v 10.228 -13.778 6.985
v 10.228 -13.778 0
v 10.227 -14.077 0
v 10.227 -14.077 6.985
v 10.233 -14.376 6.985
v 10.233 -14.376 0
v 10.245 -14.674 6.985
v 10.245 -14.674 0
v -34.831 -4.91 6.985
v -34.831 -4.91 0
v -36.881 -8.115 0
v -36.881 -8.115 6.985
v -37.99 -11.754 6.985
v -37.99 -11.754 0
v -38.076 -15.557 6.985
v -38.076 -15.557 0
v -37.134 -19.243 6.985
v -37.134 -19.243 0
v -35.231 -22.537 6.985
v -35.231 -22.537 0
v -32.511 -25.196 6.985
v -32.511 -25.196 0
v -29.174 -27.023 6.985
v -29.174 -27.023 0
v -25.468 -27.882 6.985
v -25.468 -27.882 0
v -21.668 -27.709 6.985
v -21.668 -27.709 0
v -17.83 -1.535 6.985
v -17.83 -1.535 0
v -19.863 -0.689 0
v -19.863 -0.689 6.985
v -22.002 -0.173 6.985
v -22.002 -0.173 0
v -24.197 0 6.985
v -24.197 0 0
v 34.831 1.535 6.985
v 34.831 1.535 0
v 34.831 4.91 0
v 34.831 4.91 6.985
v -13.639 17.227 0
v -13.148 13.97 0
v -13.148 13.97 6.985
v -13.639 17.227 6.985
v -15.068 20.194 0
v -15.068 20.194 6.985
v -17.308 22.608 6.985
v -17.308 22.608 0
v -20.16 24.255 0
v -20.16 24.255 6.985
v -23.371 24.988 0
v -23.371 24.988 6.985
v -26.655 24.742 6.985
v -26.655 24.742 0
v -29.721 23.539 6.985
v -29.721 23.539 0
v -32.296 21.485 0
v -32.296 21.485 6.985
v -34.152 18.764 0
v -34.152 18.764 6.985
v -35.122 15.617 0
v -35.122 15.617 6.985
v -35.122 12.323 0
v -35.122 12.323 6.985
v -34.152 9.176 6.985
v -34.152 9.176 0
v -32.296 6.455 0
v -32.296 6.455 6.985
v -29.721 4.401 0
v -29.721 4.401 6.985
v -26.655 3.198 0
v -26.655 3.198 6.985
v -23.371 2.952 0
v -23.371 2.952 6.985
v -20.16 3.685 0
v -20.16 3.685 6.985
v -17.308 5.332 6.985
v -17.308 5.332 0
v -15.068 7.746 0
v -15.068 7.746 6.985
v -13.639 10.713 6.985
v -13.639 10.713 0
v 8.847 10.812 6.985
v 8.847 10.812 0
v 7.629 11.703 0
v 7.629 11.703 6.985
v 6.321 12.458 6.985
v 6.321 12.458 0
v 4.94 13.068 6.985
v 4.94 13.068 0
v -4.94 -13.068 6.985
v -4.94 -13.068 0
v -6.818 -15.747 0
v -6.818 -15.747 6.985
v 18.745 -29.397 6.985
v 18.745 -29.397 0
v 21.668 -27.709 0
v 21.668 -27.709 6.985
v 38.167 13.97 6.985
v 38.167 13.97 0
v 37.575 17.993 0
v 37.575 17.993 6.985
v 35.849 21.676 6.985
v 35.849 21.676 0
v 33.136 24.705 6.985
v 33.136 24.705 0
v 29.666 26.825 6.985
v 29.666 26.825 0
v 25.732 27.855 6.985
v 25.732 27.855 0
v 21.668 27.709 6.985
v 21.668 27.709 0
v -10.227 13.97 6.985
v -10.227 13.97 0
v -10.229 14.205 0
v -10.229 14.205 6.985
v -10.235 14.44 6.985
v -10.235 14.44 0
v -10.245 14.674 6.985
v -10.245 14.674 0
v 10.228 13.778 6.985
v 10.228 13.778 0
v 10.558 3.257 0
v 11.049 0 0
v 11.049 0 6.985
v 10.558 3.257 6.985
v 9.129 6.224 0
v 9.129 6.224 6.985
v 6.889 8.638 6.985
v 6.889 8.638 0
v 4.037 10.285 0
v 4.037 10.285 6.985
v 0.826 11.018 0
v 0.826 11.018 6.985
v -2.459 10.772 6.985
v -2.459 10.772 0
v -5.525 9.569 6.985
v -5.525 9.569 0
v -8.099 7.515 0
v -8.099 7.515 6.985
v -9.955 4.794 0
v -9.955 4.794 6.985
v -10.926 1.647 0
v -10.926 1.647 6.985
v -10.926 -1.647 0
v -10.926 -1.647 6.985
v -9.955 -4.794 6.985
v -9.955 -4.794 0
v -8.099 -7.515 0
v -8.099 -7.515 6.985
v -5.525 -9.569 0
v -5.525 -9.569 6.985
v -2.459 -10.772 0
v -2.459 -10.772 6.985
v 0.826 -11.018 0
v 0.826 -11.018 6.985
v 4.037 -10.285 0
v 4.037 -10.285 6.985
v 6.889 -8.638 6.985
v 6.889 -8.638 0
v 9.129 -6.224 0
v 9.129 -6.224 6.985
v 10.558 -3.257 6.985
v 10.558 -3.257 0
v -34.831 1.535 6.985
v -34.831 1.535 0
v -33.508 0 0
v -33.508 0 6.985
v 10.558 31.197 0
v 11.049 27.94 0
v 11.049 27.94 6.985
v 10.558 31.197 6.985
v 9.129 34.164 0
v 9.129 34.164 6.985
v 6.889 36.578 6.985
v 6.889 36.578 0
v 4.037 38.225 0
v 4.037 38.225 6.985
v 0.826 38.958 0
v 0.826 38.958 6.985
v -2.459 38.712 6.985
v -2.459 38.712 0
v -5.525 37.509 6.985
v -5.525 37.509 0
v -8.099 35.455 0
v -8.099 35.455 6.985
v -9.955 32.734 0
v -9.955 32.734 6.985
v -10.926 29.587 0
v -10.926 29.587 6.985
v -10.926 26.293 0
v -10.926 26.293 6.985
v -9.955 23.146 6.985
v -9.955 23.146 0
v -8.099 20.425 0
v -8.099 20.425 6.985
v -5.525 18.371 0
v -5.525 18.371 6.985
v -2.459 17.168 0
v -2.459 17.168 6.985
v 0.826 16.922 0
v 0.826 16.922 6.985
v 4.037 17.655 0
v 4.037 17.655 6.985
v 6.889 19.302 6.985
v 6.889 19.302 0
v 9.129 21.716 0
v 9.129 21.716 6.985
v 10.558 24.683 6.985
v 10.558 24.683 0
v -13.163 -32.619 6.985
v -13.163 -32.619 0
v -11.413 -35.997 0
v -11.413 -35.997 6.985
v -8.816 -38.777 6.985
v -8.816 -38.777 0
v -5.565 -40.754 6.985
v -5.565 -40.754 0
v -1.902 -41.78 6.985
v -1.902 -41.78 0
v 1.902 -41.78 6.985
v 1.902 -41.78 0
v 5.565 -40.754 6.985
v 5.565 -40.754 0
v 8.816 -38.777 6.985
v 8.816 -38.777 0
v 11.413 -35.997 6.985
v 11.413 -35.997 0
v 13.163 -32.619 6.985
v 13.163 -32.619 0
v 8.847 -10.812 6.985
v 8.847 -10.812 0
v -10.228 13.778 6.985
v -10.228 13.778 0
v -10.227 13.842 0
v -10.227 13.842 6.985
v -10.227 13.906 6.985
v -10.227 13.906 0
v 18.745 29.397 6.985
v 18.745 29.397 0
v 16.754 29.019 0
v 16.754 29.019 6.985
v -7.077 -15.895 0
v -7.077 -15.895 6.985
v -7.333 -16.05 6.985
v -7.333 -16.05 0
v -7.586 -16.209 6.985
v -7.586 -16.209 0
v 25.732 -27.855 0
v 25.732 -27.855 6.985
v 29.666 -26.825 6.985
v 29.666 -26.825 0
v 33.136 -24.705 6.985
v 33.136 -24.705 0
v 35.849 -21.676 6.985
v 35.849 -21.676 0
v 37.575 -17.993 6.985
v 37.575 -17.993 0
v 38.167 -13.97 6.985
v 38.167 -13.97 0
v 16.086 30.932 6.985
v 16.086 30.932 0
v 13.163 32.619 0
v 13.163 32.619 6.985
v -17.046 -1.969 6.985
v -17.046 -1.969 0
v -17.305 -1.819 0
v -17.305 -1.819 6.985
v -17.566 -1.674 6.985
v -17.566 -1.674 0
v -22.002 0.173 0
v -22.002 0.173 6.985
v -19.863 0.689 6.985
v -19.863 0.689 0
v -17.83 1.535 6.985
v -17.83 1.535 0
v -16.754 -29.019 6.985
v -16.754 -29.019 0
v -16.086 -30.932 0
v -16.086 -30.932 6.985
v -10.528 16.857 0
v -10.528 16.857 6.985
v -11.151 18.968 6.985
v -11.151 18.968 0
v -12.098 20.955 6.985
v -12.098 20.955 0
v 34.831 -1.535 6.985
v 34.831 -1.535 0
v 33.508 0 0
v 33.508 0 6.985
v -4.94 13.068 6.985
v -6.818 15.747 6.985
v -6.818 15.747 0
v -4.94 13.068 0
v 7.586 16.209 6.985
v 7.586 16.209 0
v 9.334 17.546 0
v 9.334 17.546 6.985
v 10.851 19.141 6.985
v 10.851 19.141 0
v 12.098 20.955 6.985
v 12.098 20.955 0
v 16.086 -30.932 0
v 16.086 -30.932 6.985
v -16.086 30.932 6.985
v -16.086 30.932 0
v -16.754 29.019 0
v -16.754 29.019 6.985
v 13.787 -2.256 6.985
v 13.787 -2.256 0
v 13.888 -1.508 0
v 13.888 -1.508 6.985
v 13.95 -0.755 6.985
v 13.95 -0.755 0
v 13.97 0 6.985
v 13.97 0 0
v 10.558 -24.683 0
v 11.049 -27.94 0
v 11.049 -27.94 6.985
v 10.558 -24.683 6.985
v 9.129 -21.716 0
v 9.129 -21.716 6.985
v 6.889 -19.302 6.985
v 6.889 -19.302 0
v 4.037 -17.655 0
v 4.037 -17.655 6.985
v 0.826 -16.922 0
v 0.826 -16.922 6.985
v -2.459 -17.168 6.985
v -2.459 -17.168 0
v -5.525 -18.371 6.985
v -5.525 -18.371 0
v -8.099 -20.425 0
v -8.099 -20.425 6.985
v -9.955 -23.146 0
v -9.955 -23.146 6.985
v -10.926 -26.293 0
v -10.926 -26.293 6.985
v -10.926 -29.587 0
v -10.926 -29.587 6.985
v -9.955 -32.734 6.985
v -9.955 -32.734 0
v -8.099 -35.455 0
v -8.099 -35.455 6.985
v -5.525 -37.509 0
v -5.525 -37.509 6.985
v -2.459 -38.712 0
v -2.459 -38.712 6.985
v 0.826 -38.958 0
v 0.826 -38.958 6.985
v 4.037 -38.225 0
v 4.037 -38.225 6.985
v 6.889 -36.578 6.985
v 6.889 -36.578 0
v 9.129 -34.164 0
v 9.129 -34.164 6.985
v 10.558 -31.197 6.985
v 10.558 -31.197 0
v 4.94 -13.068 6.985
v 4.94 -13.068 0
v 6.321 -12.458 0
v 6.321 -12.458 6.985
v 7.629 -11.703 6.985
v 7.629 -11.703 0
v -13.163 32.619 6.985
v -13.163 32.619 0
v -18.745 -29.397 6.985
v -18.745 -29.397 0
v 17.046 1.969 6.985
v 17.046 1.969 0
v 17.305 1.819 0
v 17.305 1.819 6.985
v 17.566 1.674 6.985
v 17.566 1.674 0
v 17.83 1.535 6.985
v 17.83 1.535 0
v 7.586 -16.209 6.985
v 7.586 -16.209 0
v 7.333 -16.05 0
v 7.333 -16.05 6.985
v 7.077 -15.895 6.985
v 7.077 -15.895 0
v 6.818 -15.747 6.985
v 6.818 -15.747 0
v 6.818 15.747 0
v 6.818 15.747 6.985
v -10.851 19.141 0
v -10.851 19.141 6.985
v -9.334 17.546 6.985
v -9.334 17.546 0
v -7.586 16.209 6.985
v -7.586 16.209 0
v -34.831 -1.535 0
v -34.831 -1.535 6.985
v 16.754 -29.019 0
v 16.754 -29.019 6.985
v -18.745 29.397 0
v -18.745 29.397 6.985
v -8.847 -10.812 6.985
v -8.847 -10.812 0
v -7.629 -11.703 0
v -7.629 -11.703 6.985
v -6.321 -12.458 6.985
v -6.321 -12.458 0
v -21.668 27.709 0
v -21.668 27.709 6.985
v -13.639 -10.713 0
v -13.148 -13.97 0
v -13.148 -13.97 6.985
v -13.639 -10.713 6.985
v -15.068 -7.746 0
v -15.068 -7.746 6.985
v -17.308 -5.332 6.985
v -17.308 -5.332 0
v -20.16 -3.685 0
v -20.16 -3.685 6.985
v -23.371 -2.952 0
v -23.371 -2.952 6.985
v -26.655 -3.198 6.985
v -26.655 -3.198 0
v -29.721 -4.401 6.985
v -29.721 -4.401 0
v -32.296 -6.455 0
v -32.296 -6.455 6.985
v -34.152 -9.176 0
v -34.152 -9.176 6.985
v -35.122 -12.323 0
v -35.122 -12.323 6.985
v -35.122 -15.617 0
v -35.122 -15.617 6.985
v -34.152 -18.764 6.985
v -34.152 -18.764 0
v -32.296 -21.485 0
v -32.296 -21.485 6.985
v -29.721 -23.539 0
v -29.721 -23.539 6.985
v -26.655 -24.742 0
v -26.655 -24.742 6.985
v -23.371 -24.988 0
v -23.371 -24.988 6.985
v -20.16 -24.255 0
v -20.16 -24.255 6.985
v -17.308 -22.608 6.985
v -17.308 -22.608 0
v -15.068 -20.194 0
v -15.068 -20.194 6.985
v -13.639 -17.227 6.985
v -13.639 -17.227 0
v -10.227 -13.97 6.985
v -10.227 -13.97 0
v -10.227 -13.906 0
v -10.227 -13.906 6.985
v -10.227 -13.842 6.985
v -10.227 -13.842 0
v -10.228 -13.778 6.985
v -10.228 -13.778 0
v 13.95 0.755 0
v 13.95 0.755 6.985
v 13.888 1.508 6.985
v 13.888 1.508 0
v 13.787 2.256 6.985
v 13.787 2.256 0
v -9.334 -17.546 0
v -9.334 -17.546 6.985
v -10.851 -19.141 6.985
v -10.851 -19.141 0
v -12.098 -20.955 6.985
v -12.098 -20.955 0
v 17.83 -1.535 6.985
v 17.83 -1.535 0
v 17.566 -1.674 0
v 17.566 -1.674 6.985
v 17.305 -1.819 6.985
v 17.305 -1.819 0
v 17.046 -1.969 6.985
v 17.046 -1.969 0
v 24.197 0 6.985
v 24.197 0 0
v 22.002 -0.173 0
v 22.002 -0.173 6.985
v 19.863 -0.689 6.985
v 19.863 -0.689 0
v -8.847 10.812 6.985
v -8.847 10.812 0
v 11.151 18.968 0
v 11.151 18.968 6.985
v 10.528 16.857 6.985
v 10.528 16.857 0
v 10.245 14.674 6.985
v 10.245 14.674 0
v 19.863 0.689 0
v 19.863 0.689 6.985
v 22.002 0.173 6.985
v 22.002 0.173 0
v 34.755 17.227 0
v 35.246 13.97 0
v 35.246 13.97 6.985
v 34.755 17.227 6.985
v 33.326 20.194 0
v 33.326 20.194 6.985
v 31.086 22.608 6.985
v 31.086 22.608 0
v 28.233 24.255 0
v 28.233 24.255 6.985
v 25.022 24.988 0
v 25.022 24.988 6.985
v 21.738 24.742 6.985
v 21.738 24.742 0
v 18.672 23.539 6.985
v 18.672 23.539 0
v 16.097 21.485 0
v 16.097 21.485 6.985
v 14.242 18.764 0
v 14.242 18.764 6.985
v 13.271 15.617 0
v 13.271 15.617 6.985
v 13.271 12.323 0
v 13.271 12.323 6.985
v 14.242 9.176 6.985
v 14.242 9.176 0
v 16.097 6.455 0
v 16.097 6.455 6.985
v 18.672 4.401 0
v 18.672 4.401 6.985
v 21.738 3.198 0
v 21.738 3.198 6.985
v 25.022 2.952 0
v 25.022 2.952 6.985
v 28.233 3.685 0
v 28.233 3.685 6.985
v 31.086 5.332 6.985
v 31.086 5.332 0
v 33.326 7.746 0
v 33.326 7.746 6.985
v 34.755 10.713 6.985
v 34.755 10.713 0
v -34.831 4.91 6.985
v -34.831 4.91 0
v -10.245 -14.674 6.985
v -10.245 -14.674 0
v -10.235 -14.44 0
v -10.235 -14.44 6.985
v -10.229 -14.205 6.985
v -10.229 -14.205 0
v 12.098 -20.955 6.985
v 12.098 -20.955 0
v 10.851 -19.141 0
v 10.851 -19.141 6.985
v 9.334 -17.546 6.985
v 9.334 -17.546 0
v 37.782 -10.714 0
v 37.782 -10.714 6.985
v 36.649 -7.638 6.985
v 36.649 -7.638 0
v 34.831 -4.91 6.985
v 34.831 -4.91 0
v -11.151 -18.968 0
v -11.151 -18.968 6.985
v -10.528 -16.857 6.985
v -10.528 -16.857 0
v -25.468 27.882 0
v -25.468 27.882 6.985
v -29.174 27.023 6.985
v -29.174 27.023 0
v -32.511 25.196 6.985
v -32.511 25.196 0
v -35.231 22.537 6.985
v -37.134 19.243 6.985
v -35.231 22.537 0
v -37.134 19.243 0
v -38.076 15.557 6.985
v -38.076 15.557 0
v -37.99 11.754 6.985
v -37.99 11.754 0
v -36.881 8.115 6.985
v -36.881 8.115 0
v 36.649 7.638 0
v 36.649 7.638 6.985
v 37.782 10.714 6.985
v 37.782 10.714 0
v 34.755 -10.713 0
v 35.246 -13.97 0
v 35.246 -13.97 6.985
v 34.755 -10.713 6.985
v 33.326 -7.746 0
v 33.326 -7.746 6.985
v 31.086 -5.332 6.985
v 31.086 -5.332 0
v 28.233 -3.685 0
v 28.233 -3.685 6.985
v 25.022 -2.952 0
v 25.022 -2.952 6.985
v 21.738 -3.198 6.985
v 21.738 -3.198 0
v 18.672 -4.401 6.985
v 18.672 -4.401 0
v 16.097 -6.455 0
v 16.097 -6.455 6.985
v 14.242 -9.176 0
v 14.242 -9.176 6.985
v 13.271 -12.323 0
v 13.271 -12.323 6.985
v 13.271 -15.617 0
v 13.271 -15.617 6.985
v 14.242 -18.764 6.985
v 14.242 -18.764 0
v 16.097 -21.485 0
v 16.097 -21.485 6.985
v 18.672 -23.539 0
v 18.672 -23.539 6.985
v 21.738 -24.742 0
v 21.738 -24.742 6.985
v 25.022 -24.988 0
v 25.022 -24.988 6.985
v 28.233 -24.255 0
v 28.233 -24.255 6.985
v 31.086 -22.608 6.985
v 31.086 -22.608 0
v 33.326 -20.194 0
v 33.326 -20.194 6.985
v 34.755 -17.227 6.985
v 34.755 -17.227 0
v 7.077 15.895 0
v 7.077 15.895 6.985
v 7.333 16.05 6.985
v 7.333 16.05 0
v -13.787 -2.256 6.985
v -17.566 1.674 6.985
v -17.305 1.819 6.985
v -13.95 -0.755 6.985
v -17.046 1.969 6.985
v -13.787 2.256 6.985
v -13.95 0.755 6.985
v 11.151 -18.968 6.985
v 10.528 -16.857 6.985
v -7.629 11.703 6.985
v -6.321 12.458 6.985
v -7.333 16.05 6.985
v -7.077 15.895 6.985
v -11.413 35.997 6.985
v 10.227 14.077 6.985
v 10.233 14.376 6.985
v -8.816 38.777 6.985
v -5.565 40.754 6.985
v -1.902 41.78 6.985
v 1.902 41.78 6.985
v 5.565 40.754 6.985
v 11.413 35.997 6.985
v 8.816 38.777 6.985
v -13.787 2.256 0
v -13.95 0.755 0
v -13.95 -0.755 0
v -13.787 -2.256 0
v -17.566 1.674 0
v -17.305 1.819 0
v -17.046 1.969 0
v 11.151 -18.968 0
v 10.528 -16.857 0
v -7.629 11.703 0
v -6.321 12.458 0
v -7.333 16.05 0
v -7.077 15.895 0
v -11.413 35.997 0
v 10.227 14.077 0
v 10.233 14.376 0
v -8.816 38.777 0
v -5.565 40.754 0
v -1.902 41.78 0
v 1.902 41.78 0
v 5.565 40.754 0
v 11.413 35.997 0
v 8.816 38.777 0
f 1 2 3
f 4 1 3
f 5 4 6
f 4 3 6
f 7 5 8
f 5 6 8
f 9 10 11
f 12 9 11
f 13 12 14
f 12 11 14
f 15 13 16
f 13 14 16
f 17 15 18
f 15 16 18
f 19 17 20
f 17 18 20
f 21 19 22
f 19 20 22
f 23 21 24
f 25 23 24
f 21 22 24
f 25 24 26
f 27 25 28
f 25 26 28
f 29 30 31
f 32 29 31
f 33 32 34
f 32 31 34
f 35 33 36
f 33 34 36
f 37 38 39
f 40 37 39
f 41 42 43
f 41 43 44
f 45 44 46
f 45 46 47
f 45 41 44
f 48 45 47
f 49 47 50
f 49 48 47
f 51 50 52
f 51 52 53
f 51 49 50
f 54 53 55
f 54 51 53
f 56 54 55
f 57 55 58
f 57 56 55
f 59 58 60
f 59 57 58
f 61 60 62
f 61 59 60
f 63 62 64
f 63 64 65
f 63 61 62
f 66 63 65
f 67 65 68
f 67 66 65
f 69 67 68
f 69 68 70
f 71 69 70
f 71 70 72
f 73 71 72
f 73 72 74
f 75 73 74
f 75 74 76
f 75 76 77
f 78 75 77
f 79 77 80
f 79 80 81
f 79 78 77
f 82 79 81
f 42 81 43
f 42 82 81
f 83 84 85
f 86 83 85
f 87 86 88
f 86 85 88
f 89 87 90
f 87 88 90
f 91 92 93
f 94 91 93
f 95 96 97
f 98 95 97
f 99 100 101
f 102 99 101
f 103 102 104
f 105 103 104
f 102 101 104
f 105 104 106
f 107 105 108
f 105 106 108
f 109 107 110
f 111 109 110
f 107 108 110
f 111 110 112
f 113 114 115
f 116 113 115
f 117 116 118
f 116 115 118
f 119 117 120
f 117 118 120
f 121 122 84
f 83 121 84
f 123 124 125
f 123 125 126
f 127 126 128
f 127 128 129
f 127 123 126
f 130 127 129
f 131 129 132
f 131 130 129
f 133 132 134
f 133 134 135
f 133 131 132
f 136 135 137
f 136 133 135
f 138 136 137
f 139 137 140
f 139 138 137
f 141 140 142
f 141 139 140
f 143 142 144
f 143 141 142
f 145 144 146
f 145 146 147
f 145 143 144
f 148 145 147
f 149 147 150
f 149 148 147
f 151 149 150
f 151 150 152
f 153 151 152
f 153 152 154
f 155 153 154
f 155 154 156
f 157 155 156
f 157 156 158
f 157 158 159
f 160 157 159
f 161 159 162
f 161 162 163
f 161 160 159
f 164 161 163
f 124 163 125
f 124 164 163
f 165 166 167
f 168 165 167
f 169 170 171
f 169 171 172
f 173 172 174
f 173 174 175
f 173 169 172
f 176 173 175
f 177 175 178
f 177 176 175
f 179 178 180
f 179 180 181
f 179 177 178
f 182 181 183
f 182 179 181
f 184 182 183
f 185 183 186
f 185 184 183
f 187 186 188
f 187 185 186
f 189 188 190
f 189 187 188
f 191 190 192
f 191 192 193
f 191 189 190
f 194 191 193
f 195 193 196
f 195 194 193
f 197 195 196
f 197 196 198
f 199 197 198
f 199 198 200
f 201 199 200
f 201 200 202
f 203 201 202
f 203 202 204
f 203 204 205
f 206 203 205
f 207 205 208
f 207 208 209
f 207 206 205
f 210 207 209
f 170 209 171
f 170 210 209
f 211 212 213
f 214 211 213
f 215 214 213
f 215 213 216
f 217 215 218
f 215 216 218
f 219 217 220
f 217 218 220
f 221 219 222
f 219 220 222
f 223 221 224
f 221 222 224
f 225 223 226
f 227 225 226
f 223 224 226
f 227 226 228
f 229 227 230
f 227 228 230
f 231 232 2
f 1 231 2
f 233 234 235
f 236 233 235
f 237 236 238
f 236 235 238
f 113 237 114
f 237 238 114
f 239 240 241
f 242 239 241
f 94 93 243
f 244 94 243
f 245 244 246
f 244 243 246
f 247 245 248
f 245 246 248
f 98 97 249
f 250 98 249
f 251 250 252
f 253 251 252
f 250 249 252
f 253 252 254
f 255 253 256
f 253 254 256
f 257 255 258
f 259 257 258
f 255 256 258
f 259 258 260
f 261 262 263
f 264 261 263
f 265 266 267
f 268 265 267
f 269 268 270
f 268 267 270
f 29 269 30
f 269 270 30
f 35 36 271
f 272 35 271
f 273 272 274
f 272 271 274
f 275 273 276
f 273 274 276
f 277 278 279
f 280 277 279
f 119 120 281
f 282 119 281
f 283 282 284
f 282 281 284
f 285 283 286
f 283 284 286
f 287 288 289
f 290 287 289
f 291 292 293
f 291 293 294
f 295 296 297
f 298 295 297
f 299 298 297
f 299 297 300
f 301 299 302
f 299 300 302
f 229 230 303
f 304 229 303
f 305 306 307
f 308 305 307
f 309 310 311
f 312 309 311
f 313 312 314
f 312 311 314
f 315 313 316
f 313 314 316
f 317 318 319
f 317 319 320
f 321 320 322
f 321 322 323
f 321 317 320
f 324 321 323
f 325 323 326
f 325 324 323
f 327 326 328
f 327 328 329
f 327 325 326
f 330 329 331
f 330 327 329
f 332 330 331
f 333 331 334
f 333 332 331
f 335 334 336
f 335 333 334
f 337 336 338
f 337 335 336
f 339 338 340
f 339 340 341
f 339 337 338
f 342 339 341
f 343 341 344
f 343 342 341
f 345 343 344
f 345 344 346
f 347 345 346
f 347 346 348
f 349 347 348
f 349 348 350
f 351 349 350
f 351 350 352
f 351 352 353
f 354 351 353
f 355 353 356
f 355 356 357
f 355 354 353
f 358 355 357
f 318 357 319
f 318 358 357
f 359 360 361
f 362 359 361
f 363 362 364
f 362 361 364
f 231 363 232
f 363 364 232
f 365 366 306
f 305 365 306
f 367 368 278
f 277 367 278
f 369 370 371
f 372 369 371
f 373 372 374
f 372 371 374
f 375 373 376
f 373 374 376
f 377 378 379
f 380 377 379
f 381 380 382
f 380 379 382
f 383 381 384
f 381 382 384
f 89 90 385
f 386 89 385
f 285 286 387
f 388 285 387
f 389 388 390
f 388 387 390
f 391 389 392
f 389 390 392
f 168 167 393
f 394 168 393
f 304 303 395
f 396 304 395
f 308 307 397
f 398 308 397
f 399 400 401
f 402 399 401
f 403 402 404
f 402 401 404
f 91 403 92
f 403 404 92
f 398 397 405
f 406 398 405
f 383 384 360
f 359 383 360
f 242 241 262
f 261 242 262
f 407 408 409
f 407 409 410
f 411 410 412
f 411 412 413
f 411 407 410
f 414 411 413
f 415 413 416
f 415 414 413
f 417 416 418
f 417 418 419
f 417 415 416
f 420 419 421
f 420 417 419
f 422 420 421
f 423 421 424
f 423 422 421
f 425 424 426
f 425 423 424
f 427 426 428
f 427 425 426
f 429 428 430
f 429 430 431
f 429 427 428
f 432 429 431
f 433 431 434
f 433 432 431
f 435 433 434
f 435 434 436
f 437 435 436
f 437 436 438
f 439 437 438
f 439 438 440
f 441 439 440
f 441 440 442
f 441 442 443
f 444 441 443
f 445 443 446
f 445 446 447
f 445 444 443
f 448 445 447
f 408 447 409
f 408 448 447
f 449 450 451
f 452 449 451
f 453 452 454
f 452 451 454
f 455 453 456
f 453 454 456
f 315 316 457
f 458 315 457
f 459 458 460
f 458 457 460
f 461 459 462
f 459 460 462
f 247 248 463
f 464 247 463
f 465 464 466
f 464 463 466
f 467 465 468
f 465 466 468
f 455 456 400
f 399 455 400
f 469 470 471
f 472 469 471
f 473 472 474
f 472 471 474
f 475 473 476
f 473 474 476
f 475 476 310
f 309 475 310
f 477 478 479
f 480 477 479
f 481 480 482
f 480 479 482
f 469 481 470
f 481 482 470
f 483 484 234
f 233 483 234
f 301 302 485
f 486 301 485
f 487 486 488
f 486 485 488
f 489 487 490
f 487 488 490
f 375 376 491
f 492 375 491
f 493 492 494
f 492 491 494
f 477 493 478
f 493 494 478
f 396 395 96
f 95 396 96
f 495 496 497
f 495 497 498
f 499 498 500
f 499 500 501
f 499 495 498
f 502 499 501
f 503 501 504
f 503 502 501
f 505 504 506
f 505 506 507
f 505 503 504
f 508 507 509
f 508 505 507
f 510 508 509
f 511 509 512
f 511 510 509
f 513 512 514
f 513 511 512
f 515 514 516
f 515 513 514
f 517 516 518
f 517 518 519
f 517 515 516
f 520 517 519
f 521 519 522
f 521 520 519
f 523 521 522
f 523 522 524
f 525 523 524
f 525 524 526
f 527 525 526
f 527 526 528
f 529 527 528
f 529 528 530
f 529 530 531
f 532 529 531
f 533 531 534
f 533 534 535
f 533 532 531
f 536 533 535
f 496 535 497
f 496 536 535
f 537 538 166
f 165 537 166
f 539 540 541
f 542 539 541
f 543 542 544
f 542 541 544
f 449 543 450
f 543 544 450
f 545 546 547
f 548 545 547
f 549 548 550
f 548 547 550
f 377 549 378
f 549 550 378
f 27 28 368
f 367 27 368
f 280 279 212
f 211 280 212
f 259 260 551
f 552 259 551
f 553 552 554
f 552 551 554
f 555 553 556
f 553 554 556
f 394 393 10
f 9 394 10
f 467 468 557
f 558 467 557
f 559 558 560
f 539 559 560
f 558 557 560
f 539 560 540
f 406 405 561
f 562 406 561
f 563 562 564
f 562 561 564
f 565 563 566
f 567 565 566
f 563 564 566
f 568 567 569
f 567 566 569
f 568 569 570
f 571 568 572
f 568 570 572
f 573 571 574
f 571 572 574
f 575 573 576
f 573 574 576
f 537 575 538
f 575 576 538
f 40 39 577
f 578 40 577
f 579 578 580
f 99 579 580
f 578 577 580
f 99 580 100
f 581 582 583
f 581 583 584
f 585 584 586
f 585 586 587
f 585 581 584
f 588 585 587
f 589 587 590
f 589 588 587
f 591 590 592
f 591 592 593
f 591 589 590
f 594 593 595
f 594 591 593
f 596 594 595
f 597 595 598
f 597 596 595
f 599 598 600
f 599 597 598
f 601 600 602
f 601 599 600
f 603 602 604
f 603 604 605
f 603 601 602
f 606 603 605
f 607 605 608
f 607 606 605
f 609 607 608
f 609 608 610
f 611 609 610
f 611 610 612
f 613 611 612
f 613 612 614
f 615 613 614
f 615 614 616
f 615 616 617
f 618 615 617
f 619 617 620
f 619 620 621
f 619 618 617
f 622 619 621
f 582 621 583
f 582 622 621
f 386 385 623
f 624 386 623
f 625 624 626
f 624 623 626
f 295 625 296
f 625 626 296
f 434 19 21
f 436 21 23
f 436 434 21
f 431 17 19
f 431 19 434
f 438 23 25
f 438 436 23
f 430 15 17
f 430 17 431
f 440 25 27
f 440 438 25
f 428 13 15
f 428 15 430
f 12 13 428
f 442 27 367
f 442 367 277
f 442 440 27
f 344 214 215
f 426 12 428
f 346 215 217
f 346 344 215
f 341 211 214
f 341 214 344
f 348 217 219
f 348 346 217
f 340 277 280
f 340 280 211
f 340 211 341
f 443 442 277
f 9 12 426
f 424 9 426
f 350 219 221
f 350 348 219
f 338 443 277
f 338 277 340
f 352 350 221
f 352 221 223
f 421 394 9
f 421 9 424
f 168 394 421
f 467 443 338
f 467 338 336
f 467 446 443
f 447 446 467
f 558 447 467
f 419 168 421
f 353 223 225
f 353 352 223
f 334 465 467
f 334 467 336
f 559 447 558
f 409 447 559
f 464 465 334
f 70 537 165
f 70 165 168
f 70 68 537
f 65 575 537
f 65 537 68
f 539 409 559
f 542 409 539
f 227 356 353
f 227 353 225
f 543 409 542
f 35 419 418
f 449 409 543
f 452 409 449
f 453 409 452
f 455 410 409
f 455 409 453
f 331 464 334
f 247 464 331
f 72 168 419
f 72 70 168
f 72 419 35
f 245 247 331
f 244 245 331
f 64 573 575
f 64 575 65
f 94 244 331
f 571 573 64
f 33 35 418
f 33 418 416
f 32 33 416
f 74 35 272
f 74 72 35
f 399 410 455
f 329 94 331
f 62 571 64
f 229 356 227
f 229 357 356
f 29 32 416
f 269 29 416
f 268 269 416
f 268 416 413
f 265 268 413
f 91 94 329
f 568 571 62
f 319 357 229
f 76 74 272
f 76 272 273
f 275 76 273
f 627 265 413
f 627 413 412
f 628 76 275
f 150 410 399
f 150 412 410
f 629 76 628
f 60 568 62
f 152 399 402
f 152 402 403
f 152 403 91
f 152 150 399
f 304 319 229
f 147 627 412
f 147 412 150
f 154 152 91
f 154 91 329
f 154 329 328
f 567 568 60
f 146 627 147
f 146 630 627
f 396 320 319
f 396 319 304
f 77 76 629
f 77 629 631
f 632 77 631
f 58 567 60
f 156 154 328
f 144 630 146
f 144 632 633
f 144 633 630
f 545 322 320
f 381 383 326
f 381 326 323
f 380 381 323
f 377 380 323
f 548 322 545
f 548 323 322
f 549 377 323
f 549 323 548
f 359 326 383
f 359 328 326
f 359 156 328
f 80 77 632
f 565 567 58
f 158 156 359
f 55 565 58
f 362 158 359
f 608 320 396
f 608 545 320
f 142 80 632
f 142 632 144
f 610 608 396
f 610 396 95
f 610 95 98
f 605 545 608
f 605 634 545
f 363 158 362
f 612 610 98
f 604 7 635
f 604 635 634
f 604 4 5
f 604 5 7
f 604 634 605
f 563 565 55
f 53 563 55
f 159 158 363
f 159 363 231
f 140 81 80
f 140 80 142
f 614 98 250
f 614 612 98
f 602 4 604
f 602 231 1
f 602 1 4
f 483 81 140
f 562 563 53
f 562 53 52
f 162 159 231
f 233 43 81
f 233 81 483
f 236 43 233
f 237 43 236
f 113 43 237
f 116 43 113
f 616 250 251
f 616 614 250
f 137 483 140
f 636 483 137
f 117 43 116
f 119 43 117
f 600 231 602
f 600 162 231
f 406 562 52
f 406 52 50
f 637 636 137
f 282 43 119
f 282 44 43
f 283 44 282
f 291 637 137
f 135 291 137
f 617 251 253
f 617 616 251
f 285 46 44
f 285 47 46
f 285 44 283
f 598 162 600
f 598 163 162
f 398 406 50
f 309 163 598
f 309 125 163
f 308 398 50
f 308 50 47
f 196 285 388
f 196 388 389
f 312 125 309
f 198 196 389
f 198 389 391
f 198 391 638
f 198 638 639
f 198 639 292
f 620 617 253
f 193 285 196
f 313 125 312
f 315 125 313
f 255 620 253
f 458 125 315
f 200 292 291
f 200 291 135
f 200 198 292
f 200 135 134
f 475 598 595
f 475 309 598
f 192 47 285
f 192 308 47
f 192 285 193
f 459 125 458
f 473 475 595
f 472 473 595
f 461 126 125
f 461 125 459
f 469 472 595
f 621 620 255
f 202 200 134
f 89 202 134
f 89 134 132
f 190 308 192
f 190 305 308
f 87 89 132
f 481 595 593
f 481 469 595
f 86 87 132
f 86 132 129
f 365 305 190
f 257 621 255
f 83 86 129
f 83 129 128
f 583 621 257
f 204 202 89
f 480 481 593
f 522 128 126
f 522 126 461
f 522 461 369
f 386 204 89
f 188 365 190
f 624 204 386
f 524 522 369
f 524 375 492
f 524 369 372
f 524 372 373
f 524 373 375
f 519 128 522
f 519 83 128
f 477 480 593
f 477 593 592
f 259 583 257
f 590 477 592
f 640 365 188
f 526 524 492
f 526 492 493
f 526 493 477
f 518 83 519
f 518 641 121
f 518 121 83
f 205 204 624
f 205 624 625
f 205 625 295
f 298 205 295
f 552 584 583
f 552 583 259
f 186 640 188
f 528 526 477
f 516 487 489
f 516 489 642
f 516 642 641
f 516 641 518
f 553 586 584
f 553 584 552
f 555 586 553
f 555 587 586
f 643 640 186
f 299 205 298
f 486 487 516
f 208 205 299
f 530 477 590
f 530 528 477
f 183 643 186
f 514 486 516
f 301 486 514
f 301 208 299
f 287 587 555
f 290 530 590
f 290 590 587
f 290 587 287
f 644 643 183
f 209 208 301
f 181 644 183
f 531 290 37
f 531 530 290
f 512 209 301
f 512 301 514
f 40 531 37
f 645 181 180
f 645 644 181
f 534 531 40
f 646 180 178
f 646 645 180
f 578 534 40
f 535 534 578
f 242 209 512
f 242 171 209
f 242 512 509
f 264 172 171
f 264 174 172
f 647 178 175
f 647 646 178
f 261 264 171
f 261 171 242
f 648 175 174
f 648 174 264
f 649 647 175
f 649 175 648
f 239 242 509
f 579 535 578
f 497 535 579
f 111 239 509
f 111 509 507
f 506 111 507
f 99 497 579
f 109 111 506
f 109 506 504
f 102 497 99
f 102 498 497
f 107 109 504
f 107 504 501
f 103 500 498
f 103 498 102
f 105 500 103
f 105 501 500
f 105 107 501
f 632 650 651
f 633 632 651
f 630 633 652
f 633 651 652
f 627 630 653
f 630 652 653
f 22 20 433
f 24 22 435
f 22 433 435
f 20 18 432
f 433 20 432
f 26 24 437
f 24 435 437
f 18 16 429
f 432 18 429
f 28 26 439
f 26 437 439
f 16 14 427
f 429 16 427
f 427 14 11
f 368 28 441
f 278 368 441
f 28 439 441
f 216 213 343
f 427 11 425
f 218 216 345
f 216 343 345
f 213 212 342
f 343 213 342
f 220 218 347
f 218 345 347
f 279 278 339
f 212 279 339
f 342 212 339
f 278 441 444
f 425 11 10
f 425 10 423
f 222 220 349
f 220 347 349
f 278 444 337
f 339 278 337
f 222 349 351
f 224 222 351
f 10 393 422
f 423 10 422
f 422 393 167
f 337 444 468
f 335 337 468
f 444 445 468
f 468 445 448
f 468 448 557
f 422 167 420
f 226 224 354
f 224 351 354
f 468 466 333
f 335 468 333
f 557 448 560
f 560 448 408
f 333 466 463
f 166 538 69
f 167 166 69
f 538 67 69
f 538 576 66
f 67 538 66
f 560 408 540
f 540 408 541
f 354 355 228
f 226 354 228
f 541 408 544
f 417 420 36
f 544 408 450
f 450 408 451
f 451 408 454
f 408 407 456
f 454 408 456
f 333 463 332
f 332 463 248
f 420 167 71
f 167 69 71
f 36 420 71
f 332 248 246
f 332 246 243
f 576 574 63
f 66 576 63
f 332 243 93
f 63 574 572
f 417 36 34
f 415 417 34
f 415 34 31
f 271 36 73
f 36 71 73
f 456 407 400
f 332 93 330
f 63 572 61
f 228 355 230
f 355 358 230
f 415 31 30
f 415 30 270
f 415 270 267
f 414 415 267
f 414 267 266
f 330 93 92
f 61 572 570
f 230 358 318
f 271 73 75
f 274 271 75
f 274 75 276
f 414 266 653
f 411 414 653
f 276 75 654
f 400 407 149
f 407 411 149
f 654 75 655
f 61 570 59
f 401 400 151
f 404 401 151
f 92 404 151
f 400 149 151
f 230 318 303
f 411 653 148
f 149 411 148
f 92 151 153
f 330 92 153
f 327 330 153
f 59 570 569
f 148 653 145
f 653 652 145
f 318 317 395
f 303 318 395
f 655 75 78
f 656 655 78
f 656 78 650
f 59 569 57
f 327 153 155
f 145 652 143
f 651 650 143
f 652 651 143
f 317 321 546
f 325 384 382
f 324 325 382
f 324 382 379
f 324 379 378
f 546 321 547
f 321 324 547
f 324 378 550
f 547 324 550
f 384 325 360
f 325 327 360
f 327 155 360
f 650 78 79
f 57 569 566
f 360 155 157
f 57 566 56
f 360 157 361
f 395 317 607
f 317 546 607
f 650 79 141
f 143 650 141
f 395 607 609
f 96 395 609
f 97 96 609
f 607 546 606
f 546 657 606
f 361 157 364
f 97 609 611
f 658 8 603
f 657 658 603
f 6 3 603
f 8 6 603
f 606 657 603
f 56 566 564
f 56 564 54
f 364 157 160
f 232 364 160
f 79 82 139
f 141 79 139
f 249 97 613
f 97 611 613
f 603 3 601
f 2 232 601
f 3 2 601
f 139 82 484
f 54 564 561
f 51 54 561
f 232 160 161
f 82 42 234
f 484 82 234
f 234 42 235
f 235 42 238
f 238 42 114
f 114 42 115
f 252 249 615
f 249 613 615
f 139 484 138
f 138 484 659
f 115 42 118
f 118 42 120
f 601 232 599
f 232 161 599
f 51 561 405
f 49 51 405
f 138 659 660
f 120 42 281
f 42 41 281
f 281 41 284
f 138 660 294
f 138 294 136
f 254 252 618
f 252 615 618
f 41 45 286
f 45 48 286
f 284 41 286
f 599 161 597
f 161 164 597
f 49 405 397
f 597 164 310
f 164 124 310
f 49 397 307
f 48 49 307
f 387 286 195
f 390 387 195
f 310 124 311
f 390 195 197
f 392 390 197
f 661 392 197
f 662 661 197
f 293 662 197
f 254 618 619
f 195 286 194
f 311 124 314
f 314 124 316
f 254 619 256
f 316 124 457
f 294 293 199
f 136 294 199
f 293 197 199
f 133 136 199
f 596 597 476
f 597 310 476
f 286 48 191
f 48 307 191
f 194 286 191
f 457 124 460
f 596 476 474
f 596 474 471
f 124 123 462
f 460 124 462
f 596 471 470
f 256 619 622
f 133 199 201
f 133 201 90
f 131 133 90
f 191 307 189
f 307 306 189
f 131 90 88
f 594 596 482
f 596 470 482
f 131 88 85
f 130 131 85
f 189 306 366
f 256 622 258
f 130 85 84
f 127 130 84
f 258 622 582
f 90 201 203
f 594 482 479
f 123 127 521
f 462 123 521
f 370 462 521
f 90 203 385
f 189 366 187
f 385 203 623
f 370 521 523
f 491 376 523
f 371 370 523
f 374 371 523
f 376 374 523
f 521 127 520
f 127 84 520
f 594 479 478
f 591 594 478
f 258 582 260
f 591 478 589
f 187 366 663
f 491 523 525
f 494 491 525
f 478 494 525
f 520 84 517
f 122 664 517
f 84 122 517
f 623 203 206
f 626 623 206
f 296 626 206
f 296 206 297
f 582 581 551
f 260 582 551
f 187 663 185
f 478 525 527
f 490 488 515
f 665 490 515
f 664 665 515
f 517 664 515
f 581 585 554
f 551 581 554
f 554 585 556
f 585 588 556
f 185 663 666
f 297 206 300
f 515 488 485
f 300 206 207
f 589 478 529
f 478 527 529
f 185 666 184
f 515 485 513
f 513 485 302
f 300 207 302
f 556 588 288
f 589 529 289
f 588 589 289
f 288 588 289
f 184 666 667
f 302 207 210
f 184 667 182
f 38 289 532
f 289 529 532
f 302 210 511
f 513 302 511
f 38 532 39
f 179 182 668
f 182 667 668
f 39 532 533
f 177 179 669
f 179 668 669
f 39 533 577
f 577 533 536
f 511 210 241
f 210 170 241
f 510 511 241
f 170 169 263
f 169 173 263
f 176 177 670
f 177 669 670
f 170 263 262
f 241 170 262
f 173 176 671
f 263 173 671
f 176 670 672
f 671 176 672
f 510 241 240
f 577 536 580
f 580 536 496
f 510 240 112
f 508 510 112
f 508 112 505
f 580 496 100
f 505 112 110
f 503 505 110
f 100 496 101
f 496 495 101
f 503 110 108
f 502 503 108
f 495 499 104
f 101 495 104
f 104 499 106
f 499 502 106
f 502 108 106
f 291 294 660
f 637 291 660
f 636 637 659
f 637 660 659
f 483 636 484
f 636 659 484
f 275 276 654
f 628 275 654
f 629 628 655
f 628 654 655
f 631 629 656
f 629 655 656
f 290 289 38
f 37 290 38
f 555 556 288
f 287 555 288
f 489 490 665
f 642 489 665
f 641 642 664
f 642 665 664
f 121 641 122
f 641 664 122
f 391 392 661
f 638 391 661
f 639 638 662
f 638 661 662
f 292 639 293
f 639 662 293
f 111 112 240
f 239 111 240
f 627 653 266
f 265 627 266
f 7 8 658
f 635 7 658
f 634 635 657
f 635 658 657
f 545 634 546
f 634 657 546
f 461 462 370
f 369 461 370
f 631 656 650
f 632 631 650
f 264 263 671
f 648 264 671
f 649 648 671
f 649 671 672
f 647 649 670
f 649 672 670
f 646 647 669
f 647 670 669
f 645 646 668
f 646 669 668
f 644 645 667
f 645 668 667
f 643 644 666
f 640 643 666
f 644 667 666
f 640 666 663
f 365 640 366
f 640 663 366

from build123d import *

# Parameters (mm, degrees)
F0_R     = 11.049
F1_DEPTH = 6.985


# Not quite as in the source:
# - a feature names something its author has since deleted; it is built from what else it names


with BuildPart() as f1:
    # F0 (on Top) → F1 (new body)
    with BuildSketch(Plane.XY):
        with BuildLine():
            ThreePointArc((13.786655701, -2.2558866507), (13.9240884826, -1.1316624621), (13.97, 0))
            ThreePointArc((13.97, 0), (13.9240884826, 1.1316624621), (13.786655701, 2.2558866507))
            ThreePointArc((13.786655701, 2.2558866507), (13.1567408564, 4.6969213362), (12.0983748352, 6.9850000964))
            ThreePointArc((12.0983748352, 6.9850000964), (10.6460235529, 9.0456112293), (8.8469829981, 10.811650745))
            ThreePointArc((8.8469829981, 10.811650745), (6.985, 12.0983748909), (4.9396727029, 13.0675373957))
            ThreePointArc((4.9396727029, 13.0675373957), (2.5107172862, 13.7425324707), (0, 13.97))
            ThreePointArc((0, 13.97), (-2.5107172862, 13.7425324707), (-4.9396727029, 13.0675373957))
            ThreePointArc((-4.9396727029, 13.0675373957), (-6.985, 12.0983748909), (-8.8469829981, 10.811650745))
            ThreePointArc((-8.8469829981, 10.811650745), (-10.6460236342, 9.0456111335), (-12.0983749609, 6.9849998787))
            ThreePointArc((-12.0983749609, 6.9849998787), (-13.1567408986, 4.6969212179), (-13.786655701, 2.2558866507))
            ThreePointArc((-13.786655701, 2.2558866507), (-13.97, 0), (-13.786655701, -2.2558866507))
            ThreePointArc((-13.786655701, -2.2558866507), (-13.1567408656, -4.6969213103), (-12.0983748628, -6.9850000487))
            ThreePointArc((-12.0983748628, -6.9850000487), (-10.6460235707, -9.0456112083), (-8.8469829981, -10.811650745))
            ThreePointArc((-8.8469829981, -10.811650745), (-6.985, -12.0983748909), (-4.9396727029, -13.0675373957))
            ThreePointArc((-4.9396727029, -13.0675373957), (-2.5107172928, -13.7425324695), (-1.35e-08, -13.97))
            ThreePointArc((-1.35e-08, -13.97), (2.5107172795, -13.7425324719), (4.9396727029, -13.0675373957))
            ThreePointArc((4.9396727029, -13.0675373957), (6.985, -12.0983748909), (8.8469829981, -10.811650745))
            ThreePointArc((8.8469829981, -10.811650745), (10.6460235529, -9.0456112293), (12.0983748352, -6.9850000964))
            ThreePointArc((12.0983748352, -6.9850000964), (13.1567408564, -4.6969213362), (13.786655701, -2.2558866507))
        make_face()
        Circle(F0_R, mode=Mode.SUBTRACT)
        with BuildLine():
            ThreePointArc((12.0983748352, 6.9850000964), (13.1567408564, 4.6969213362), (13.786655701, 2.2558866507))
            Line((13.786655701, 2.2558866507), (17.0463049997, 1.9686650985))
            ThreePointArc((17.0463049997, 1.9686650985), (14.2508878564, 4.1597639905), (12.0983748352, 6.9850000964))
        make_face()
        with BuildLine():
            Line((17.0463049997, -1.9686650985), (13.786655701, -2.2558866507))
            ThreePointArc((13.786655701, -2.2558866507), (13.1567408564, -4.6969213362), (12.0983748352, -6.9850000964))
            ThreePointArc((12.0983748352, -6.9850000964), (14.2508878564, -4.1597639905), (17.0463049997, -1.9686650985))
        make_face()
        with BuildLine():
            ThreePointArc((8.8469829981, 10.811650745), (10.6460235529, 9.0456112293), (12.0983748352, 6.9850000964))
            ThreePointArc((12.0983748352, 6.9850000964), (10.7279051882, 10.2617490221), (10.2280664867, 13.7782006212))
            Line((10.2280664867, 13.7782006212), (8.8469829981, 10.811650745))
        make_face()
        with BuildLine():
            ThreePointArc((10.2280664867, 13.7782006212), (10.7279051882, 10.2617490221), (12.0983748352, 6.9850000964))
            ThreePointArc((12.0983748352, 6.9850000964), (14.2508878564, 4.1597639905), (17.0463049997, 1.9686650985))
            ThreePointArc((17.0463049997, 1.9686650985), (17.4348836488, 1.7455136549), (17.8304191968, 1.5349392891))
            ThreePointArc((17.8304191968, 1.5349392891), (20.9223718291, 0.3891550696), (24.1967497683, 0))
            ThreePointArc((24.1967497683, 0), (30.0531688702, 1.2868120939), (34.8306887676, 4.9101853415))
            ThreePointArc((34.8306887676, 4.9101853415), (37.3062316104, 9.1427454817), (38.1667497817, 13.97))
            ThreePointArc((38.1667497817, 13.97), (33.1362668167, 24.7052659577), (21.6676896268, 27.7091686333))
            ThreePointArc((21.6676896268, 27.7091686333), (16.1409964163, 25.3834016715), (12.0983749062, 20.9550000265))
            ThreePointArc((12.0983749062, 20.9550000265), (10.7982040971, 17.9247279977), (10.244506016, 14.67412634))
            ThreePointArc((10.244506016, 14.67412634), (10.2291009922, 14.2262953244), (10.2280664867, 13.7782006212))
        make_face()
        with Locations((24.1967497817, 13.97)):
            Circle(F0_R, mode=Mode.SUBTRACT)
        with BuildLine():
            ThreePointArc((10.2280664867, -13.7782006212), (10.7279051882, -10.2617490221), (12.0983748352, -6.9850000964))
            ThreePointArc((12.0983748352, -6.9850000964), (10.6460235529, -9.0456112293), (8.8469829981, -10.811650745))
            Line((8.8469829981, -10.811650745), (10.2280664867, -13.7782006212))
        make_face()
        with BuildLine():
            ThreePointArc((17.0463049997, -1.9686650985), (14.2508878564, -4.1597639905), (12.0983748352, -6.9850000964))
            ThreePointArc((12.0983748352, -6.9850000964), (10.7279051882, -10.2617490221), (10.2280664867, -13.7782006212))
            ThreePointArc((10.2280664867, -13.7782006212), (10.2291009922, -14.2262953244), (10.244506016, -14.67412634))
            ThreePointArc((10.244506016, -14.67412634), (10.7982040928, -17.9247279832), (12.0983748911, -20.9550000004))
            ThreePointArc((12.0983748911, -20.9550000004), (16.140996404, -25.3834016628), (21.6676896268, -27.7091686333))
            ThreePointArc((21.6676896268, -27.7091686333), (33.1362668167, -24.7052659577), (38.1667497817, -13.97))
            ThreePointArc((38.1667497817, -13.97), (37.3062316104, -9.1427454817), (34.8306887676, -4.9101853415))
            ThreePointArc((34.8306887676, -4.9101853415), (30.0531688702, -1.2868120939), (24.1967497683, 0))
            ThreePointArc((24.1967497683, 0), (20.9223718291, -0.3891550696), (17.8304191968, -1.5349392891))
            ThreePointArc((17.8304191968, -1.5349392891), (17.4348836488, -1.7455136549), (17.0463049997, -1.9686650985))
        make_face()
        with Locations((24.1967497817, -13.97)):
            Circle(F0_R, mode=Mode.SUBTRACT)
        with BuildLine():
            ThreePointArc((0, 13.97), (2.5107172862, 13.7425324707), (4.9396727029, 13.0675373957))
            Line((4.9396727029, 13.0675373957), (6.818238513, 15.7468657196))
            ThreePointArc((6.818238513, 15.7468657196), (3.5229826925, 14.4215129194), (0, 13.97))
        make_face()
        with BuildLine():
            ThreePointArc((34.8306887676, 4.9101853415), (30.0531688702, 1.2868120939), (24.1967497683, 0))
            ThreePointArc((24.1967497683, 0), (30.0531688702, -1.2868120939), (34.8306887676, -4.9101853415))
            Line((34.8306887676, -4.9101853415), (34.8306887676, -1.5349392891))
            Line((34.8306887676, -1.5349392891), (33.5076935589, 0))
            Line((33.5076935589, 0), (34.8306887676, 1.5349392891))
            Line((34.8306887676, 1.5349392891), (34.8306887676, 4.9101853415))
        make_face()
        with BuildLine():
            Line((6.818238513, -15.7468657196), (4.9396727029, -13.0675373957))
            ThreePointArc((4.9396727029, -13.0675373957), (2.5107172795, -13.7425324719), (-1.35e-08, -13.97))
            ThreePointArc((-1.35e-08, -13.97), (3.5229826859, -14.4215129177), (6.818238513, -15.7468657196))
        make_face()
        with BuildLine():
            ThreePointArc((-4.9396727029, 13.0675373957), (-2.5107172862, 13.7425324707), (0, 13.97))
            ThreePointArc((0, 13.97), (-3.5229826925, 14.4215129194), (-6.818238513, 15.7468657196))
            Line((-6.818238513, 15.7468657196), (-4.9396727029, 13.0675373957))
        make_face()
        with BuildLine():
            ThreePointArc((-6.818238513, 15.7468657196), (-3.5229826925, 14.4215129194), (0, 13.97))
            ThreePointArc((0, 13.97), (3.5229826925, 14.4215129194), (6.818238513, 15.7468657196))
            ThreePointArc((6.818238513, 15.7468657196), (7.2057826566, 15.9718089794), (7.5859131808, 16.2090656291))
            ThreePointArc((7.5859131808, 16.2090656291), (10.1241677534, 18.3138830621), (12.0983749062, 20.9550000265))
            ThreePointArc((12.0983749062, 20.9550000265), (13.4939837972, 24.3242979547), (13.97, 27.94))
            ThreePointArc((13.97, 27.94), (13.7667715532, 30.314215871), (13.1629991407, 32.6193539748))
            ThreePointArc((13.1629991407, 32.6193539748), (0, 41.91), (-13.1629991407, 32.6193539748))
            ThreePointArc((-13.1629991407, 32.6193539748), (-13.9121724704, 26.670213737), (-12.0983748684, 20.9549999611))
            ThreePointArc((-12.0983748684, 20.9549999611), (-10.1241677273, 18.3138830348), (-7.5859131808, 16.2090656291))
            ThreePointArc((-7.5859131808, 16.2090656291), (-7.2057826566, 15.9718089794), (-6.818238513, 15.7468657196))
        make_face()
        with Locations((0, 27.94)):
            Circle(F0_R, mode=Mode.SUBTRACT)
        with BuildLine():
            ThreePointArc((13.97, 27.94), (13.4939837972, 24.3242979547), (12.0983749062, 20.9550000265))
            ThreePointArc((12.0983749062, 20.9550000265), (16.1409964163, 25.3834016715), (21.6676896268, 27.7091686333))
            Line((21.6676896268, 27.7091686333), (18.7446408014, 29.3967916595))
            Line((18.7446408014, 29.3967916595), (16.7538467795, 29.0185138443))
            Line((16.7538467795, 29.0185138443), (16.0860479661, 30.9317309486))
            Line((16.0860479661, 30.9317309486), (13.1629991407, 32.6193539748))
            ThreePointArc((13.1629991407, 32.6193539748), (13.7667715532, 30.314215871), (13.97, 27.94))
        make_face()
        with BuildLine():
            ThreePointArc((-6.818238513, -15.7468657196), (-3.522982699, -14.4215129211), (-1.35e-08, -13.97))
            ThreePointArc((-1.35e-08, -13.97), (-2.5107172928, -13.7425324695), (-4.9396727029, -13.0675373957))
            Line((-4.9396727029, -13.0675373957), (-6.818238513, -15.7468657196))
        make_face()
        with BuildLine():
            ThreePointArc((6.818238513, -15.7468657196), (3.5229826859, -14.4215129177), (-1.35e-08, -13.97))
            ThreePointArc((-1.35e-08, -13.97), (-3.522982699, -14.4215129211), (-6.818238513, -15.7468657196))
            ThreePointArc((-6.818238513, -15.7468657196), (-7.2057826566, -15.9718089794), (-7.5859131808, -16.2090656291))
            ThreePointArc((-7.5859131808, -16.2090656291), (-10.1241677569, -18.3138830658), (-12.0983749113, -20.9550000353))
            ThreePointArc((-12.0983749113, -20.9550000353), (-13.9121724743, -26.6702137797), (-13.1629991407, -32.6193539748))
            ThreePointArc((-13.1629991407, -32.6193539748), (0, -41.91), (13.1629991407, -32.6193539748))
            ThreePointArc((13.1629991407, -32.6193539748), (13.7667715532, -30.314215871), (13.97, -27.94))
            ThreePointArc((13.97, -27.94), (13.4939837933, -24.3242979401), (12.0983748911, -20.9550000004))
            ThreePointArc((12.0983748911, -20.9550000004), (10.124167743, -18.3138830512), (7.5859131808, -16.2090656291))
            ThreePointArc((7.5859131808, -16.2090656291), (7.2057826566, -15.9718089794), (6.818238513, -15.7468657196))
        make_face()
        with Locations((0, -27.94)):
            Circle(F0_R, mode=Mode.SUBTRACT)
        with BuildLine():
            ThreePointArc((21.6676896268, -27.7091686333), (16.140996404, -25.3834016628), (12.0983748911, -20.9550000004))
            ThreePointArc((12.0983748911, -20.9550000004), (13.4939837933, -24.3242979401), (13.97, -27.94))
            ThreePointArc((13.97, -27.94), (13.7667715532, -30.314215871), (13.1629991407, -32.6193539748))
            Line((13.1629991407, -32.6193539748), (16.0860479661, -30.9317309486))
            Line((16.0860479661, -30.9317309486), (16.7538467795, -29.0185138443))
            Line((16.7538467795, -29.0185138443), (18.7446408014, -29.3967916595))
            Line((18.7446408014, -29.3967916595), (21.6676896268, -27.7091686333))
        make_face()
        with BuildLine():
            ThreePointArc((-12.0983749609, 6.9849998787), (-10.6460236342, 9.0456111335), (-8.8469829981, 10.811650745))
            Line((-8.8469829981, 10.811650745), (-10.2280664867, 13.7782006212))
            ThreePointArc((-10.2280664867, 13.7782006212), (-10.7279052216, 10.261748901), (-12.0983749609, 6.9849998787))
        make_face()
        with BuildLine():
            Line((-10.2280664867, -13.7782006212), (-8.8469829981, -10.811650745))
            ThreePointArc((-8.8469829981, -10.811650745), (-10.6460235707, -9.0456112083), (-12.0983748628, -6.9850000487))
            ThreePointArc((-12.0983748628, -6.9850000487), (-10.7279051955, -10.2617489956), (-10.2280664867, -13.7782006212))
        make_face()
        with BuildLine():
            ThreePointArc((-13.786655701, 2.2558866507), (-13.1567408986, 4.6969212179), (-12.0983749609, 6.9849998787))
            ThreePointArc((-12.0983749609, 6.9849998787), (-14.2508879446, 4.1597639011), (-17.0463049997, 1.9686650985))
            Line((-17.0463049997, 1.9686650985), (-13.786655701, 2.2558866507))
        make_face()
        with BuildLine():
            ThreePointArc((-17.0463049997, 1.9686650985), (-14.2508879446, 4.1597639011), (-12.0983749609, 6.9849998787))
            ThreePointArc((-12.0983749609, 6.9849998787), (-10.7279052216, 10.261748901), (-10.2280664867, 13.7782006212))
            ThreePointArc((-10.2280664867, 13.7782006212), (-10.2270789618, 13.8740980508), (-10.2267497817, 13.97))
            ThreePointArc((-10.2267497817, 13.97), (-10.2311895458, 14.3221750937), (-10.244506016, 14.67412634))
            ThreePointArc((-10.244506016, 14.67412634), (-10.7982040864, 17.9247279614), (-12.0983748684, 20.9549999611))
            ThreePointArc((-12.0983748684, 20.9549999611), (-16.1409963854, 25.3834016497), (-21.6676896268, 27.7091686333))
            ThreePointArc((-21.6676896268, 27.7091686333), (-36.2951246726, 20.955), (-34.8306887676, 4.9101853415))
            ThreePointArc((-34.8306887676, 4.9101853415), (-30.0531688763, 1.2868120967), (-24.1967497817, 0))
            ThreePointArc((-24.1967497817, 0), (-20.9223718356, 0.3891550681), (-17.8304191968, 1.5349392891))
            ThreePointArc((-17.8304191968, 1.5349392891), (-17.4348836488, 1.7455136549), (-17.0463049997, 1.9686650985))
        make_face()
        with Locations((-24.1967497817, 13.97)):
            Circle(F0_R, mode=Mode.SUBTRACT)
        with BuildLine():
            ThreePointArc((-21.6676896268, 27.7091686333), (-16.1409963854, 25.3834016497), (-12.0983748684, 20.9549999611))
            ThreePointArc((-12.0983748684, 20.9549999611), (-13.9121724704, 26.670213737), (-13.1629991407, 32.6193539748))
            Line((-13.1629991407, 32.6193539748), (-16.0860479661, 30.9317309486))
            Line((-16.0860479661, 30.9317309486), (-16.7538467795, 29.0185138443))
            Line((-16.7538467795, 29.0185138443), (-18.7446408014, 29.3967916595))
            Line((-18.7446408014, 29.3967916595), (-21.6676896268, 27.7091686333))
        make_face()
        with BuildLine():
            ThreePointArc((-17.0463049997, -1.9686650985), (-14.2508878757, -4.1597639709), (-12.0983748628, -6.9850000487))
            ThreePointArc((-12.0983748628, -6.9850000487), (-13.1567408656, -4.6969213103), (-13.786655701, -2.2558866507))
            Line((-13.786655701, -2.2558866507), (-17.0463049997, -1.9686650985))
        make_face()
        with BuildLine():
            ThreePointArc((-10.2280664867, -13.7782006212), (-10.7279051955, -10.2617489956), (-12.0983748628, -6.9850000487))
            ThreePointArc((-12.0983748628, -6.9850000487), (-14.2508878757, -4.1597639709), (-17.0463049997, -1.9686650985))
            ThreePointArc((-17.0463049997, -1.9686650985), (-17.4348836488, -1.7455136549), (-17.8304191968, -1.5349392891))
            ThreePointArc((-17.8304191968, -1.5349392891), (-20.9223718356, -0.3891550681), (-24.1967497817, 0))
            ThreePointArc((-24.1967497817, 0), (-30.0531688763, -1.2868120967), (-34.8306887676, -4.9101853415))
            ThreePointArc((-34.8306887676, -4.9101853415), (-36.2951246726, -20.955), (-21.6676896268, -27.7091686333))
            ThreePointArc((-21.6676896268, -27.7091686333), (-16.1409964205, -25.3834016745), (-12.0983749113, -20.9550000353))
            ThreePointArc((-12.0983749113, -20.9550000353), (-10.7982040985, -17.9247280026), (-10.244506016, -14.67412634))
            ThreePointArc((-10.244506016, -14.67412634), (-10.2311895458, -14.3221750937), (-10.2267497817, -13.97))
            ThreePointArc((-10.2267497817, -13.97), (-10.2270789618, -13.8740980508), (-10.2280664867, -13.7782006212))
        make_face()
        with Locations((-24.1967497817, -13.97)):
            Circle(F0_R, mode=Mode.SUBTRACT)
        with BuildLine():
            ThreePointArc((-13.1629991407, -32.6193539748), (-13.9121724743, -26.6702137797), (-12.0983749113, -20.9550000353))
            ThreePointArc((-12.0983749113, -20.9550000353), (-16.1409964205, -25.3834016745), (-21.6676896268, -27.7091686333))
            Line((-21.6676896268, -27.7091686333), (-18.7446408014, -29.3967916595))
            Line((-18.7446408014, -29.3967916595), (-16.7538467795, -29.0185138443))
            Line((-16.7538467795, -29.0185138443), (-16.0860479661, -30.9317309486))
            Line((-16.0860479661, -30.9317309486), (-13.1629991407, -32.6193539748))
        make_face()
        with BuildLine():
            ThreePointArc((-24.1967497817, 0), (-30.0531688763, 1.2868120967), (-34.8306887676, 4.9101853415))
            Line((-34.8306887676, 4.9101853415), (-34.8306887676, 1.5349392891))
            Line((-34.8306887676, 1.5349392891), (-33.5076935589, 0))
            Line((-33.5076935589, 0), (-34.8306887676, -1.5349392891))
            Line((-34.8306887676, -1.5349392891), (-34.8306887676, -4.9101853415))
            ThreePointArc((-34.8306887676, -4.9101853415), (-30.0531688763, -1.2868120967), (-24.1967497817, 0))
        make_face()
    extrude(amount=F1_DEPTH)


solid = f1.part
